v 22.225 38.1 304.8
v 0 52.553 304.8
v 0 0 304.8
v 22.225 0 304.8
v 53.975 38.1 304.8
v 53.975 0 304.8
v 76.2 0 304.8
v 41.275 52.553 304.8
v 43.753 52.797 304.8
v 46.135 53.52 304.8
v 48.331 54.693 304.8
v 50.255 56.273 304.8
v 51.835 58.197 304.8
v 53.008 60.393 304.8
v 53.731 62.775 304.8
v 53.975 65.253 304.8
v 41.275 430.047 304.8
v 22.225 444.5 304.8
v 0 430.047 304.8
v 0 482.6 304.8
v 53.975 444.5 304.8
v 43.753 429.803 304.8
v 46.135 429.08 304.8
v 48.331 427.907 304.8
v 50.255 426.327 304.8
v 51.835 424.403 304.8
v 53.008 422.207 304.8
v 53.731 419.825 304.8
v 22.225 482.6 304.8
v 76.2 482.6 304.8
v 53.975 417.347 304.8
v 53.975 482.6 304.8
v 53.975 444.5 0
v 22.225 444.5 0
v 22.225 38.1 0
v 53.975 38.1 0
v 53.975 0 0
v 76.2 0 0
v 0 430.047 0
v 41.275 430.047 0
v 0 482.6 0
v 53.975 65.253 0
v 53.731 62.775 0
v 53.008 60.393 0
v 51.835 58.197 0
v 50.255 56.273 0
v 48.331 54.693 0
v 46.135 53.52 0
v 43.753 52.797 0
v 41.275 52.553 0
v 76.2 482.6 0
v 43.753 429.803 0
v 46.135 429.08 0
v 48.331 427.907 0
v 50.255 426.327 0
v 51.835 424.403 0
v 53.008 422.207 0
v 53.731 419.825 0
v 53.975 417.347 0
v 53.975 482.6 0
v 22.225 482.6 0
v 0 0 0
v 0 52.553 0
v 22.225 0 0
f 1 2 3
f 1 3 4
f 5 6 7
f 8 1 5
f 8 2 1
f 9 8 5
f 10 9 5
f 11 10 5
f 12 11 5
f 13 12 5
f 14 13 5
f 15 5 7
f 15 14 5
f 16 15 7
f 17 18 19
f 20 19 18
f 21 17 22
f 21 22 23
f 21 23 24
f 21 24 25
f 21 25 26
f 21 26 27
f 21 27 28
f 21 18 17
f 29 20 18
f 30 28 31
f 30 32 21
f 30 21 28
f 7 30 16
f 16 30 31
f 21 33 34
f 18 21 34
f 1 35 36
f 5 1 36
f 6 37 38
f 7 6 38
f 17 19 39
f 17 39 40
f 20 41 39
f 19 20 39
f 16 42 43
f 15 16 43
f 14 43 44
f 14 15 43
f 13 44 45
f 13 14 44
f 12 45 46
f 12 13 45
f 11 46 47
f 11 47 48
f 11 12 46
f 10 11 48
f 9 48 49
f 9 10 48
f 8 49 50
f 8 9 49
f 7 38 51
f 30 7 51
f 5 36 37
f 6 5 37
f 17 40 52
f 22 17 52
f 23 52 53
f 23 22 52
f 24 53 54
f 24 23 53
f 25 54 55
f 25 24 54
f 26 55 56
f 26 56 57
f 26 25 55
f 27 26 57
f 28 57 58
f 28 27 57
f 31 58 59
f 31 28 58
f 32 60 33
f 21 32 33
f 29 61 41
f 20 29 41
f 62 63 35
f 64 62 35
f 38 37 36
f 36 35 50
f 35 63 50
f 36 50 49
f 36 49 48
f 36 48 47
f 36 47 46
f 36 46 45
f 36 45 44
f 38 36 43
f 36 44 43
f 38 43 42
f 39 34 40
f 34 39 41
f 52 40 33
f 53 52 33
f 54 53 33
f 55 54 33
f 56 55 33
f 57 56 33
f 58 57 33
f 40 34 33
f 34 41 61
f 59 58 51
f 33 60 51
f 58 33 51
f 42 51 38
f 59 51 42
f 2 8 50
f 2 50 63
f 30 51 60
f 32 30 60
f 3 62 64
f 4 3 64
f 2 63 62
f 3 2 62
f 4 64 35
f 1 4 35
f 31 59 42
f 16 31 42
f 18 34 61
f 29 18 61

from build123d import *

# Parameters (mm, degrees)
F1_DEPTH = 304.8
F2_R     = 12.7


with BuildPart() as f1:
    # F0 (on Top) → F1 (new body)
    with BuildSketch(Plane.XY):
        Polygon((0, 52.552884), (0, 0), (22.225, 0), (22.225, 38.1), (53.975, 38.1), (53.975, 0), (76.2, 0), (76.2, 482.6), (53.975, 482.6), (53.975, 444.5), (22.225, 444.5), (22.225, 482.6), (0, 482.6), (0, 430.047116), (22.225, 430.047116), (53.975, 430.047116), (53.975, 52.552884), (22.225, 52.552884), align=None)
    extrude(amount=F1_DEPTH)

    # F2
    f2_edges = [f1.edges().sort_by_distance(p)[0] for p in [
        (53.975, 430.047116, 152.4),
        (53.975, 52.552884, 152.4),
    ]]
    fillet(f2_edges, radius=F2_R)


solid = f1.part
